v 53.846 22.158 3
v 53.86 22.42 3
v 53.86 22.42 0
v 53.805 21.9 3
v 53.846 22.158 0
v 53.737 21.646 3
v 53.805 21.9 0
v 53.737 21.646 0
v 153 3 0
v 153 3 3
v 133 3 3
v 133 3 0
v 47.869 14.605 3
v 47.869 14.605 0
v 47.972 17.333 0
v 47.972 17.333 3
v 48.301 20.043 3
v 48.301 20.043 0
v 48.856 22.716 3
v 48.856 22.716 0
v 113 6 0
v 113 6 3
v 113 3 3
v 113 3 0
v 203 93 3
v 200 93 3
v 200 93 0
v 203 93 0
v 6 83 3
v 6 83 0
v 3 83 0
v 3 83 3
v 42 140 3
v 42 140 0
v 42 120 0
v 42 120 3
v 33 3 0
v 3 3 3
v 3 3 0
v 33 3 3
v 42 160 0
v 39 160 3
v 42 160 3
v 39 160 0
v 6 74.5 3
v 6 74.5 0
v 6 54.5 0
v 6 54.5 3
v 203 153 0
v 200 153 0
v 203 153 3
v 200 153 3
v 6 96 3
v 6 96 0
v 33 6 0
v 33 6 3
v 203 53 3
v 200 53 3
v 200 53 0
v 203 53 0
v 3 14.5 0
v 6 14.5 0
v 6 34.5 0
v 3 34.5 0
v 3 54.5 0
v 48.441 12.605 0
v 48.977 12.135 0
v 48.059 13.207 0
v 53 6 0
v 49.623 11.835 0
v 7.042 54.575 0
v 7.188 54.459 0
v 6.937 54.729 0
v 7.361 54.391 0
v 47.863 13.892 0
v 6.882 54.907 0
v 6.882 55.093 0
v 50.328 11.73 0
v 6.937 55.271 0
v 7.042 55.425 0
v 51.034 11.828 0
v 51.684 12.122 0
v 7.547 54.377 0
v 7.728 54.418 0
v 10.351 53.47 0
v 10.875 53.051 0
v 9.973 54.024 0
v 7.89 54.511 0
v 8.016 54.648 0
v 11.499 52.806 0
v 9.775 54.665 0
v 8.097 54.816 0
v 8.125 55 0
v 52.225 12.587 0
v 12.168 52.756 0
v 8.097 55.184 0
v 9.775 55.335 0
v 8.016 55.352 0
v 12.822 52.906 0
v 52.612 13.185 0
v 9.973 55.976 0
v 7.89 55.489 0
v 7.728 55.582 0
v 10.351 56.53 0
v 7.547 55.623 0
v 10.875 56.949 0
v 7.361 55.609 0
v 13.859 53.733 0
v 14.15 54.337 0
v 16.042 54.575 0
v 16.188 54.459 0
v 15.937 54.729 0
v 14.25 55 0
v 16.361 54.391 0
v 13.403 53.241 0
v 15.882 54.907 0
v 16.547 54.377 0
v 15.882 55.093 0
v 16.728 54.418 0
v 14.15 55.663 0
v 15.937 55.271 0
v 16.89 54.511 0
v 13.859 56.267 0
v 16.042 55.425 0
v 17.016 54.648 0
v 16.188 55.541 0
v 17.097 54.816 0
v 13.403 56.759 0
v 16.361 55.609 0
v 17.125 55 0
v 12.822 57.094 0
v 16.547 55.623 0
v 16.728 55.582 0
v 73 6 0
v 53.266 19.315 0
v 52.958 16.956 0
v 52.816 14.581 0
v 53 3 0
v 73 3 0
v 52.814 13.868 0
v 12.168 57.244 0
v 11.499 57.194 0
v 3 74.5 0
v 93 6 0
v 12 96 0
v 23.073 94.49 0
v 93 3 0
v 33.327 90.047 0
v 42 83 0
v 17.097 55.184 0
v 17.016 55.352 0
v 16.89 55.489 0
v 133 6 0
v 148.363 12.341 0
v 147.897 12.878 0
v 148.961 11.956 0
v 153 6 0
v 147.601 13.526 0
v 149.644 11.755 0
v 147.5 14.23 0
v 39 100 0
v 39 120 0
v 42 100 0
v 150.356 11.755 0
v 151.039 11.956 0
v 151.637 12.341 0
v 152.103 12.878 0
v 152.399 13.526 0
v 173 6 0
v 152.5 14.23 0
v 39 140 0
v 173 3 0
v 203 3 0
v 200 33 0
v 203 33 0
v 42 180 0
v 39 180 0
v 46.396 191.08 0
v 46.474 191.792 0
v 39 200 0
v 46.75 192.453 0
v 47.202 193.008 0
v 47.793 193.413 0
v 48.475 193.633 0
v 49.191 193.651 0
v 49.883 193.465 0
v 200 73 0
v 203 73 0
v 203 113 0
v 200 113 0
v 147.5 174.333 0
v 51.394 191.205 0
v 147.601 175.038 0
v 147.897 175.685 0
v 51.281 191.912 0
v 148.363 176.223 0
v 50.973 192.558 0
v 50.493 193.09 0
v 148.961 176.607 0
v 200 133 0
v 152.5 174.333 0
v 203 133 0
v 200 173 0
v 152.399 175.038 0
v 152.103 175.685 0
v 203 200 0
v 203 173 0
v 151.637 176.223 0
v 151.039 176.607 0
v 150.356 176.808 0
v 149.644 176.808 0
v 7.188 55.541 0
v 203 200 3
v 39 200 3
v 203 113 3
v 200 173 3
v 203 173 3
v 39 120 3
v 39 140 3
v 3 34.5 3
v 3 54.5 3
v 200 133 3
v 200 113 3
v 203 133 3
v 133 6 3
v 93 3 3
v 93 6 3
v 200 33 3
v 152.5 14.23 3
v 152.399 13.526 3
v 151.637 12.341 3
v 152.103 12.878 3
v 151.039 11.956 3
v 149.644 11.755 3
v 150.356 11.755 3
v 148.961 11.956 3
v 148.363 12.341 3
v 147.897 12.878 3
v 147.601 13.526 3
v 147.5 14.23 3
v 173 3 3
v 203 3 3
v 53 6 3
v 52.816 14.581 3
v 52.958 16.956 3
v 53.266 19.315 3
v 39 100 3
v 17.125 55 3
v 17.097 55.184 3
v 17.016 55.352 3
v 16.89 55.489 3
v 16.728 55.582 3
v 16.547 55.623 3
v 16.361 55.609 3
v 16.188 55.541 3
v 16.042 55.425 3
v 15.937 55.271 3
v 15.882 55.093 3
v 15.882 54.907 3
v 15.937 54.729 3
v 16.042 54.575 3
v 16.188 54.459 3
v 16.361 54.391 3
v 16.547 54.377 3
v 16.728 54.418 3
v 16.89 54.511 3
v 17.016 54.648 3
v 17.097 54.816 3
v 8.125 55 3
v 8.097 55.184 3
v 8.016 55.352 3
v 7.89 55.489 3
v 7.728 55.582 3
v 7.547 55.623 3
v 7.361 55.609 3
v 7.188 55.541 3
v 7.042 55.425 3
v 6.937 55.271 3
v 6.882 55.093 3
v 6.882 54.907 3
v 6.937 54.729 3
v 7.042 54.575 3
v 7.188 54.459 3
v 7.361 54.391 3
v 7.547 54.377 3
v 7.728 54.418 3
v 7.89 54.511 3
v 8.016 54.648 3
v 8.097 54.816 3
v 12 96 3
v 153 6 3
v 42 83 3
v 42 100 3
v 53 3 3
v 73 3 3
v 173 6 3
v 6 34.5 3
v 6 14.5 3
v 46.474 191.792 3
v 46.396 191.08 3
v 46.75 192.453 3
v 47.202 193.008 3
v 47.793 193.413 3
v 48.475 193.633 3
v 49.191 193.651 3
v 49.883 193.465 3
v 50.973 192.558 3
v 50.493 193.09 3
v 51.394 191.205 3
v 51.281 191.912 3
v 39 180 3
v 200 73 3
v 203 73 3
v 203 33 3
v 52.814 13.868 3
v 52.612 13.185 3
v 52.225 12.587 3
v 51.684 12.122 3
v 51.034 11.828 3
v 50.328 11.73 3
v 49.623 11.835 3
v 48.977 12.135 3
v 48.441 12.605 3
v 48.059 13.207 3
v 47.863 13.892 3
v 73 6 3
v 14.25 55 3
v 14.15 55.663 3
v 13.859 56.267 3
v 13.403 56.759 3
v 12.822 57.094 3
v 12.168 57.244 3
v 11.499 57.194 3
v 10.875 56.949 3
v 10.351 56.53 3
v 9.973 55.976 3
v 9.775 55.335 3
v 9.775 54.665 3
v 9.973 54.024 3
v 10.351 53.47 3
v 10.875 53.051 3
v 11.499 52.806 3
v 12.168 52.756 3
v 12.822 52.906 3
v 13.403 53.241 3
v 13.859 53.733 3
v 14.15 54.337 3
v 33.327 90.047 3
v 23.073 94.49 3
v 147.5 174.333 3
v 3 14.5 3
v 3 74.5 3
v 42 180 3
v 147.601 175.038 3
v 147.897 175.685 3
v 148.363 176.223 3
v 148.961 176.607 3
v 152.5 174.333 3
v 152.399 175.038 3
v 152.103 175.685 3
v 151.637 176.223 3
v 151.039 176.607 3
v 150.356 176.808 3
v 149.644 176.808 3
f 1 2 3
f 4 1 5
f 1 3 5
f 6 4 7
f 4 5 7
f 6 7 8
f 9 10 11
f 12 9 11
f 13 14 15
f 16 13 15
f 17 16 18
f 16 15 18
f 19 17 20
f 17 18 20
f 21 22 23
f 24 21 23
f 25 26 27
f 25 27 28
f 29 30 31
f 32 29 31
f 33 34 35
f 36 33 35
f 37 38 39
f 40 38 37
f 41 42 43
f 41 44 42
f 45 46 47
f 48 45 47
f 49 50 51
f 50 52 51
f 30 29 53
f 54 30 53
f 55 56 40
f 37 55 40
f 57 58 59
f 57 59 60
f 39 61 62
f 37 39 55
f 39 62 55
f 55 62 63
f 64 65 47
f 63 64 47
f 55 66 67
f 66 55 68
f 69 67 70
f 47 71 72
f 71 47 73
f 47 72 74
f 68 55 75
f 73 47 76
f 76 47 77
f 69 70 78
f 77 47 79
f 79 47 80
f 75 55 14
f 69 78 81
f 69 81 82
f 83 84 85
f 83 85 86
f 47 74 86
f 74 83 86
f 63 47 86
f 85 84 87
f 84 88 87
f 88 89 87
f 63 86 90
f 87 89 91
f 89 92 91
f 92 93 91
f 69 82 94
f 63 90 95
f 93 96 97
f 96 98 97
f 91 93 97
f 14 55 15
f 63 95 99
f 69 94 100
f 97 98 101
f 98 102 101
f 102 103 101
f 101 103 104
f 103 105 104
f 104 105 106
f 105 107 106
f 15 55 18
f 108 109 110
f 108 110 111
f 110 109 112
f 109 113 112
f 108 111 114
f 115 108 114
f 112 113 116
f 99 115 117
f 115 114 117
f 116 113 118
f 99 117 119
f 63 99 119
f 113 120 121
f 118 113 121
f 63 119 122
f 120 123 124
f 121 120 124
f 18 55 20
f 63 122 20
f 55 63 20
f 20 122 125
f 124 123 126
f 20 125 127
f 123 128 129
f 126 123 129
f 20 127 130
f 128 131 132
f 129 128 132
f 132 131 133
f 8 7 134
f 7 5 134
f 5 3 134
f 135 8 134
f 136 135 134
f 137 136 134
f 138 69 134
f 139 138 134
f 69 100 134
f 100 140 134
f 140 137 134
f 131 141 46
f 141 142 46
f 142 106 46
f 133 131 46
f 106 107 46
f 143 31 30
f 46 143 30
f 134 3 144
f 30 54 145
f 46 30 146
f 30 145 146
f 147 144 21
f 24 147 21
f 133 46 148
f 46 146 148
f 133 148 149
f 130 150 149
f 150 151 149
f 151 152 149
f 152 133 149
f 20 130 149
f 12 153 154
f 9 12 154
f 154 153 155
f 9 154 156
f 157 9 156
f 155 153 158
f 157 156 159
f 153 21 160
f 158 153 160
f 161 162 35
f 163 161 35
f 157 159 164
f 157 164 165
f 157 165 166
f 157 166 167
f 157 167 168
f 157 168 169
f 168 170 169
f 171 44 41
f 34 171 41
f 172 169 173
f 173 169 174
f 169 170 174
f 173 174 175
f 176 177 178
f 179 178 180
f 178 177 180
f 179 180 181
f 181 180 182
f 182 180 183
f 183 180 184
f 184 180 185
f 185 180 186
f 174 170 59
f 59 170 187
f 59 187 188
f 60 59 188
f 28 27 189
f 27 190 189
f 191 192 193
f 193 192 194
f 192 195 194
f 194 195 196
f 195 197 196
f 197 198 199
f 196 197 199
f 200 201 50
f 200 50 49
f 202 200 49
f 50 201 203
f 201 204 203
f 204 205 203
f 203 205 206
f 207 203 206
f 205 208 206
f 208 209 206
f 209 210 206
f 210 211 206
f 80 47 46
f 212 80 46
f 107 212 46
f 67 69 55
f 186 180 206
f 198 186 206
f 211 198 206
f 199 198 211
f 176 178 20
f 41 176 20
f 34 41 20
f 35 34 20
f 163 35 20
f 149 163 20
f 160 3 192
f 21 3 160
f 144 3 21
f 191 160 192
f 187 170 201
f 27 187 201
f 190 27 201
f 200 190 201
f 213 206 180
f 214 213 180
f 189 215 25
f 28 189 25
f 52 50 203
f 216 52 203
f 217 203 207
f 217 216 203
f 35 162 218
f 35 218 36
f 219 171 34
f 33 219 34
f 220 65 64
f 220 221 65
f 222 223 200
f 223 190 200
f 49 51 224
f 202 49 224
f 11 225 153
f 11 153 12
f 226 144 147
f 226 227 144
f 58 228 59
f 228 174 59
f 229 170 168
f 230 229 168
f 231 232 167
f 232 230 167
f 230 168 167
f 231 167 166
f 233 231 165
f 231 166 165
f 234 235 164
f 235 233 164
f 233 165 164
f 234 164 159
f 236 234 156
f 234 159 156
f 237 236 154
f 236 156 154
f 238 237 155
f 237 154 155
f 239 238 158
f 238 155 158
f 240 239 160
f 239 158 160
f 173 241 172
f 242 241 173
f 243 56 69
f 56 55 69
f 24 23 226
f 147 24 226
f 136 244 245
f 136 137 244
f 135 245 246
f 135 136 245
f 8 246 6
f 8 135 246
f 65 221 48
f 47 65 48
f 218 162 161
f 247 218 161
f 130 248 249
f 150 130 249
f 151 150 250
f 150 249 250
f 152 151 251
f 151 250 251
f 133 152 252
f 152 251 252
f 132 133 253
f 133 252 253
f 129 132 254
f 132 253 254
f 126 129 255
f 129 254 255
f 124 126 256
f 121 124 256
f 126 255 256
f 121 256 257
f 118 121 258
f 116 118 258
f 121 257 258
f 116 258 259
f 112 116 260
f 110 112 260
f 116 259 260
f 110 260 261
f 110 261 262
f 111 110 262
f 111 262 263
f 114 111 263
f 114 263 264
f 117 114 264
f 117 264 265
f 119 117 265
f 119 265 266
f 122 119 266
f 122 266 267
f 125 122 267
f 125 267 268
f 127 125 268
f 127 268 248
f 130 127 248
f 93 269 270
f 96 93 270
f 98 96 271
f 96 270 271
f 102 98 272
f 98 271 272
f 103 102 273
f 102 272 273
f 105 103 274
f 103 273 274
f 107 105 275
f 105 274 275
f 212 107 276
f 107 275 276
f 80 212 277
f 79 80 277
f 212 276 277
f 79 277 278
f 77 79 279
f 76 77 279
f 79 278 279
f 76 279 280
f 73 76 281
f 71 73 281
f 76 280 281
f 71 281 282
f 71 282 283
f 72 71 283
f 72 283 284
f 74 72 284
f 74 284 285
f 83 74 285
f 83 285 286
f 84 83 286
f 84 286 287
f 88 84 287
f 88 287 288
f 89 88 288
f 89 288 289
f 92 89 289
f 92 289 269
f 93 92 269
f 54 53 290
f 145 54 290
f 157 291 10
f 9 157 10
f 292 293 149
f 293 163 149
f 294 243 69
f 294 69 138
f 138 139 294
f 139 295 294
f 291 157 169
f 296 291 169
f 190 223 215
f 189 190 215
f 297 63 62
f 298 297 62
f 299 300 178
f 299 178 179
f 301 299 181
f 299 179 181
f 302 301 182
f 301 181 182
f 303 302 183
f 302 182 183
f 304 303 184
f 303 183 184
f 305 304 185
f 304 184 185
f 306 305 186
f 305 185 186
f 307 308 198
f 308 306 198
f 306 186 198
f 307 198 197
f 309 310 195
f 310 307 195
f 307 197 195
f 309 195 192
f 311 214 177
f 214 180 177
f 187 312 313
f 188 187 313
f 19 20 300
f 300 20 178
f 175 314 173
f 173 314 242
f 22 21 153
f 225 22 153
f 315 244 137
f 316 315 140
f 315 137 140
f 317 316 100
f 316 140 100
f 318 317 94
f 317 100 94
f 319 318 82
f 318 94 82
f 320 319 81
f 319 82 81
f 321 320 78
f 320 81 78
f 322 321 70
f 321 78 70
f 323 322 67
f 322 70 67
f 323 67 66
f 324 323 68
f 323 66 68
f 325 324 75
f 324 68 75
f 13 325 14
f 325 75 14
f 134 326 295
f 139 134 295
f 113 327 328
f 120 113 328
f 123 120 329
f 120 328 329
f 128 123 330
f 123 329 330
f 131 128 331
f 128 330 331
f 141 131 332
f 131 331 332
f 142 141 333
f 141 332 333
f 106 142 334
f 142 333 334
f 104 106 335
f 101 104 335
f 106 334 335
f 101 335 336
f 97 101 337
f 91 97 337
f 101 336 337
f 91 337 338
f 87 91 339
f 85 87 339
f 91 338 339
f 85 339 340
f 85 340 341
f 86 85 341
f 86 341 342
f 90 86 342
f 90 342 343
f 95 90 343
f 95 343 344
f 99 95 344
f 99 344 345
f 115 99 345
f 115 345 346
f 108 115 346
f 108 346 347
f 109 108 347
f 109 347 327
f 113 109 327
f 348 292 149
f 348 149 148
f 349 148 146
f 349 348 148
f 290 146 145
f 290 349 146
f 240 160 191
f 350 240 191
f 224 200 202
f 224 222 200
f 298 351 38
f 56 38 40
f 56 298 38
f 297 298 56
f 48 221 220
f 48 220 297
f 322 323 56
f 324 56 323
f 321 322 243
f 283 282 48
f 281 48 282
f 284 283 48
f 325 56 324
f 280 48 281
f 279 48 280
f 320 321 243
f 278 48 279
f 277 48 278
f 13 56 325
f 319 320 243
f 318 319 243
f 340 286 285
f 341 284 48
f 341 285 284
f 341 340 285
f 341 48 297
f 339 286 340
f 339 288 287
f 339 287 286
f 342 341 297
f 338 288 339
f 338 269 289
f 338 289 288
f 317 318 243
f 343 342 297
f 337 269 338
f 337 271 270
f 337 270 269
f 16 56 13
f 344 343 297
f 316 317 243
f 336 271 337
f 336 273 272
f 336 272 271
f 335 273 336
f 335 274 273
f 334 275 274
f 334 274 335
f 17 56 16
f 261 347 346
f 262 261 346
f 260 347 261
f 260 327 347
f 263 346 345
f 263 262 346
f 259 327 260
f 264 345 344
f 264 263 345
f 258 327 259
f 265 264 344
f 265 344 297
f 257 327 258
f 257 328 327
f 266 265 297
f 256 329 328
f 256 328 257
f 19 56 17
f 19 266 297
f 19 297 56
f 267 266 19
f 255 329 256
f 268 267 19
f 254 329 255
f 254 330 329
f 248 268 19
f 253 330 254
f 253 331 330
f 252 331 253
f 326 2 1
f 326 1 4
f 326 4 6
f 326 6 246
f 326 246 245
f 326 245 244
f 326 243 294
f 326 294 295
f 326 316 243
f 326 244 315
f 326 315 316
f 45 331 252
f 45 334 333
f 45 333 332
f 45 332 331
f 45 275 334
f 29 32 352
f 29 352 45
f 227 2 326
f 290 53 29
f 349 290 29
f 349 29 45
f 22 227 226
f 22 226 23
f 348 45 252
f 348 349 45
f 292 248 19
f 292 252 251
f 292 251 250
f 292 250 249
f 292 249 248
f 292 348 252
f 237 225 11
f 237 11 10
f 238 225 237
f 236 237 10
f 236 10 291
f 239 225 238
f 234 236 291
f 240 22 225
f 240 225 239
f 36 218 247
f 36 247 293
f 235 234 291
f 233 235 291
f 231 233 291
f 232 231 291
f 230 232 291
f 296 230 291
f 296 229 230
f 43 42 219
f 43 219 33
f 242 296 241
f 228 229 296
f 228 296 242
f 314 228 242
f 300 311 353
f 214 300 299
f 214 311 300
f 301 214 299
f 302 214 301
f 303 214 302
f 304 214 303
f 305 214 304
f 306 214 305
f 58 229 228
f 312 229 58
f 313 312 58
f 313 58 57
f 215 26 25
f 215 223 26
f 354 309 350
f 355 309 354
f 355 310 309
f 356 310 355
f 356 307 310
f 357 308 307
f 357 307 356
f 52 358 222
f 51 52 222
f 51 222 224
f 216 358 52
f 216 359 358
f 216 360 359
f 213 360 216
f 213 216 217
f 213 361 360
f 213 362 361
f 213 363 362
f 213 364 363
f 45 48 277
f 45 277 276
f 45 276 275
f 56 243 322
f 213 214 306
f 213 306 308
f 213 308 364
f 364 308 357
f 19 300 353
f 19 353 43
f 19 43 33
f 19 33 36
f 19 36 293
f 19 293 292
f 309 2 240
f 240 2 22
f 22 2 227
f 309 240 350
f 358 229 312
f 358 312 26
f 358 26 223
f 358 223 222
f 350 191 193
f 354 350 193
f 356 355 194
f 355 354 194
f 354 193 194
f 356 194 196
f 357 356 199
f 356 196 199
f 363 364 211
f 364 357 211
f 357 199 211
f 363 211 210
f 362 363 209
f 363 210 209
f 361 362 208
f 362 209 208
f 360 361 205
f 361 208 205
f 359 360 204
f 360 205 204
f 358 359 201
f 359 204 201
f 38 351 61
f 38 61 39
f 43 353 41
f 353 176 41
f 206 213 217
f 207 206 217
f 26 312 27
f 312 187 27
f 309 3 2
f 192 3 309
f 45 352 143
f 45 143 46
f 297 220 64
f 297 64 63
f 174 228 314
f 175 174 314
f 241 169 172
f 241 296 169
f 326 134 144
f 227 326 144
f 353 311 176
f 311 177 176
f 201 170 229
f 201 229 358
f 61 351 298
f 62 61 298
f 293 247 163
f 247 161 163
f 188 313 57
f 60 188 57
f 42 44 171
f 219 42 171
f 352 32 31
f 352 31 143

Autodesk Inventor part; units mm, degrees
ref_plane "YZ Plane" through (0, 0, 0) normal (1, 0, 0) x (0, 1, 0)
ref_plane "XZ Plane" through (0, 0, 0) normal (0, 1, 0) x (-1, 0, 0)
ref_plane "XY Plane" through (0, 0, 0) normal (0, 0, 1) x (1, 0, 0)
sketch "Sketch1" plane through (0, 0, 0) normal (0, 0, 1) x (1, 0, 0)
  line L0 (6, 6) -> (200, 6)
  line L1 (200, 6) -> (200, 200)
  line L2 (200, 200) -> (42, 200)
  line L3 (6, 83) -> (6, 6)
  line L4 (6, 6) -> (56, 6)
  line L5 (200, 6) -> (150, 6)
  line L6 (200, 6) -> (200, 153)
  line L7 (150, 6) -> (142.5, 6)
  line L8 (200, 6) -> (200, 166)
  arc A0 (152.5, 174.3333) -> (147.5, 174.3333) centre (150, 174.3333) ccw
  line L9 (150, 6) -> (50, 6)
  arc A1 (47.8689, 14.6053) -> (52.8158, 14.5813) centre (50.3406, 14.23) ccw
  arc A2 (53.8259, 22.009) -> (52.8051, 13.8106) centre (86.918, 13.7258) ccw
  arc A3 (51.3944, 191.2047) -> (46.3962, 191.0801) centre (48.8946, 191.1682) ccw
  line L10 (53.8599, 22.4199) -> (51.3944, 191.2047)
  line L11 (48.8556, 22.7156) -> (46.3962, 191.0801)
  arc A4 (53.7373, 21.6465) -> (53.8589, 22.4929) centre (51.3599, 22.4199) ccw
  arc A5 (48.8556, 22.7156) -> (47.8689, 14.6053) centre (80.6169, 14.7362) ccw
  line L12 (52.8406, 14.23) -> (52.8088, 14.23)
  arc A6 (147.5, 14.23) -> (152.5, 14.23) centre (150, 14.23) ccw
  line L13 (147.5, 14.23) -> (147.5, 174.3333)
  line L14 (152.5, 14.23) -> (152.5, 174.3333)
  line L15 (42, 83) -> (6, 83)
  line L16 (42, 200) -> (39, 200)
  line L17 (39, 200) -> (39, 180)
  line L18 (39, 160) -> (39, 140)
  line L19 (39, 120) -> (39, 100)
  line L20 (39, 100) -> (42, 100)
  line L21 (39, 120) -> (42, 120)
  line L22 (39, 140) -> (42, 140)
  line L23 (39, 160) -> (42, 160)
  line L24 (39, 180) -> (42, 180)
  line L25 (39, 120) -> (39, 100)
  line L26 (39, 200) -> (39, 180)
  line L27 (39, 160) -> (39, 140)
  line L28 (42, 180) -> (42, 160)
  line L29 (42, 140) -> (42, 120)
  line L30 (42, 100) -> (42, 83)
  dimension "d1" = 194
extrude "Extrusion1" add sketch "Sketch1" along normal blind 3
sketch "Sketch2" plane through (0, 0, 3) normal (0, 0, 1) x (1, 0, 0)
  line L0 (200, 6) -> (200, 200) projected
  line L1 (200, 200) -> (39, 200) projected
  line L2 (42, 180) -> (42, 160) projected
  line L3 (42, 83) -> (6, 83) projected
  line L4 (6, 83) -> (6, 6) projected
  line L5 (6, 6) -> (200, 6) projected
  line L6 (147.5, 14.23) -> (147.5, 174.3333) projected
  arc A0 (152.5, 174.3333) -> (147.5, 174.3333) centre (150, 174.3333) ccw projected
  line L7 (152.5, 174.3333) -> (152.5, 14.23) projected
  arc A1 (147.5, 14.23) -> (152.5, 14.23) centre (150, 14.23) ccw projected
  arc A2 (51.3944, 191.2047) -> (46.3962, 191.0801) centre (48.8946, 191.1682) ccw projected
  line L8 (51.3944, 191.2047) -> (53.8589, 22.4929) projected
  arc A3 (53.7373, 21.6465) -> (53.8589, 22.4929) centre (51.3599, 22.4199) ccw projected
  arc A4 (53.7373, 21.6465) -> (52.8158, 14.5813) centre (86.918, 13.7258) ccw projected
  arc A5 (47.8689, 14.6053) -> (52.8158, 14.5813) centre (50.3406, 14.23) ccw projected
  arc A6 (48.8556, 22.7156) -> (47.8689, 14.6053) centre (80.6169, 14.7362) ccw projected
  line L9 (48.8556, 22.7156) -> (46.3962, 191.0801) projected
  line L10 (6, 6) -> (33, 6)
  line L11 (33, 6) -> (53, 6)
  line L12 (53, 6) -> (73, 6)
  line L13 (73, 6) -> (93, 6)
  line L14 (93, 6) -> (113, 6)
  line L15 (113, 6) -> (133, 6)
  line L16 (133, 6) -> (153, 6)
  line L17 (153, 6) -> (173, 6)
  line L18 (6, 6) -> (6, 9)
  line L19 (33, 6) -> (33, 3)
  line L20 (173, 6) -> (173, 3)
  line L21 (53, 6) -> (53, 3)
  line L22 (93, 6) -> (93, 3)
  line L23 (73, 6) -> (73, 3)
  line L24 (133, 6) -> (133, 3)
  line L25 (113, 6) -> (113, 3)
  line L26 (153, 6) -> (153, 3)
  line L27 (6, 6) -> (6, 3)
  line L28 (6, 3) -> (33, 3)
  line L29 (173, 3) -> (200, 3)
  line L30 (200, 3) -> (200, 6.6126)
  line L31 (73, 3) -> (53, 3)
  line L32 (153, 3) -> (133, 3)
  line L33 (113, 3) -> (93, 3)
  line L34 (39, 200) -> (39, 180) projected
  line L35 (39, 180) -> (42, 180) projected
  line L36 (42, 160) -> (39, 160) projected
  line L37 (39, 160) -> (39, 140) projected
  line L38 (39, 140) -> (42, 140) projected
  line L39 (42, 140) -> (42, 120) projected
  line L40 (42, 120) -> (39, 120) projected
  line L41 (39, 120) -> (39, 100) projected
  line L42 (39, 100) -> (42, 100) projected
  line L43 (42, 100) -> (42, 83) projected
  point P0 (120.702, 9)
  point P1 (49.056, 9)
extrude "Extrusion2" add sketch "Sketch2" against normal blind 3 contours L30 L29 L20 L5 | L26 L32 L24 L5 | L25 L33 L22 L5 | L23 L31 L21 L5 | L19 L28 L27 L5
sketch "Sketch3" plane through (0, 0, 3) normal (0, 0, 1) x (1, 0, 0)
  line L0 (153, 6) -> (173, 6) projected
  line L1 (113, 6) -> (133, 6) projected
  line L2 (200, 3) -> (200, 200) projected
  line L3 (200, 200) -> (39, 200) projected
  line L4 (42, 180) -> (42, 160) projected
  line L5 (42, 83) -> (6, 83) projected
  line L6 (6, 83) -> (6, 3) projected
  line L7 (73, 6) -> (93, 6) projected
  line L8 (33, 6) -> (53, 6) projected
  line L9 (147.5, 14.23) -> (147.5, 174.3333) projected
  arc A0 (152.5, 174.3333) -> (147.5, 174.3333) centre (150, 174.3333) ccw projected
  line L10 (152.5, 174.3333) -> (152.5, 14.23) projected
  arc A1 (147.5, 14.23) -> (152.5, 14.23) centre (150, 14.23) ccw projected
  arc A2 (51.3944, 191.2047) -> (46.3962, 191.0801) centre (48.8946, 191.1682) ccw projected
  line L11 (51.3944, 191.2047) -> (53.8589, 22.4929) projected
  arc A3 (53.7373, 21.6465) -> (53.8589, 22.4929) centre (51.3599, 22.4199) ccw projected
  arc A4 (53.7373, 21.6465) -> (52.8158, 14.5813) centre (86.918, 13.7258) ccw projected
  arc A5 (47.8689, 14.6053) -> (52.8158, 14.5813) centre (50.3406, 14.23) ccw projected
  arc A6 (48.8556, 22.7156) -> (47.8689, 14.6053) centre (80.6169, 14.7362) ccw projected
  line L12 (48.8556, 22.7156) -> (46.3962, 191.0801) projected
  line L13 (6, 83) -> (6, 80)
  line L14 (6, 83) -> (3, 83)
  line L15 (3, 6) -> (3, 14.5)
  line L16 (3, 83) -> (3, 74.5)
  line L17 (3, 54.5) -> (3, 34.5)
  line L18 (3, 74.5) -> (6, 74.5)
  line L19 (3, 54.5) -> (6, 54.5)
  line L20 (3, 34.5) -> (6, 34.5)
  line L21 (3, 14.5) -> (6, 14.5)
  line L22 (3, 14.5) -> (3, 6)
  line L23 (3, 83) -> (3, 74.5)
  line L24 (3, 54.5) -> (3, 34.5)
  line L25 (3, 6) -> (3, 3)
  line L26 (3, 3) -> (6, 3)
  line L27 (6, 3) -> (6, 6)
  line L28 (6, 3) -> (33, 3) projected
  line L29 (33, 3) -> (33, 6) projected
  line L30 (53, 6) -> (53, 3) projected
  line L31 (53, 3) -> (73, 3) projected
  line L32 (73, 3) -> (73, 6) projected
  line L33 (93, 6) -> (93, 3) projected
  line L34 (93, 3) -> (113, 3) projected
  line L35 (113, 3) -> (113, 6) projected
  line L36 (133, 6) -> (133, 3) projected
  line L37 (133, 3) -> (153, 3) projected
  line L38 (153, 3) -> (153, 6) projected
  line L39 (173, 6) -> (173, 3) projected
  line L40 (173, 3) -> (200, 3) projected
  line L41 (39, 200) -> (39, 180) projected
  line L42 (39, 180) -> (42, 180) projected
  line L43 (42, 160) -> (39, 160) projected
  line L44 (39, 160) -> (39, 140) projected
  line L45 (39, 140) -> (42, 140) projected
  line L46 (42, 140) -> (42, 120) projected
  line L47 (42, 120) -> (39, 120) projected
  line L48 (39, 120) -> (39, 100) projected
  line L49 (39, 100) -> (42, 100) projected
  line L50 (42, 100) -> (42, 83) projected
  point P0 (6, 3)
  dimension "d43" = 3
extrude "Extrusion3" add sketch "Sketch3" against normal blind 3 contours L26 L25 L15 L21 L6 | L6 L18 L16 L14 | L20 L17 L19 L6
sketch "Sketch4" plane through (0, 0, 3) normal (0, 0, 1) x (1, 0, 0)
  line L0 (153, 6) -> (173, 6) projected
  line L1 (113, 6) -> (133, 6) projected
  line L2 (200, 200) -> (39, 200) projected
  line L3 (42, 180) -> (42, 160) projected
  line L4 (42, 83) -> (3, 83) projected
  line L5 (3, 83) -> (3, 74.5) projected
  line L6 (3, 74.5) -> (6, 74.5) projected
  line L7 (6, 74.5) -> (6, 54.5) projected
  line L8 (6, 54.5) -> (3, 54.5) projected
  line L9 (3, 54.5) -> (3, 34.5) projected
  line L10 (3, 34.5) -> (6, 34.5) projected
  line L11 (73, 6) -> (93, 6) projected
  line L12 (33, 6) -> (53, 6) projected
  line L13 (147.5, 14.23) -> (147.5, 174.3333) projected
  arc A0 (152.5, 174.3333) -> (147.5, 174.3333) centre (150, 174.3333) ccw projected
  line L14 (152.5, 174.3333) -> (152.5, 14.23) projected
  arc A1 (147.5, 14.23) -> (152.5, 14.23) centre (150, 14.23) ccw projected
  arc A2 (51.3944, 191.2047) -> (46.3962, 191.0801) centre (48.8946, 191.1682) ccw projected
  line L15 (51.3944, 191.2047) -> (53.8589, 22.4929) projected
  arc A3 (53.7373, 21.6465) -> (53.8589, 22.4929) centre (51.3599, 22.4199) ccw projected
  arc A4 (53.7373, 21.6465) -> (52.8158, 14.5813) centre (86.918, 13.7258) ccw projected
  arc A5 (47.8689, 14.6053) -> (52.8158, 14.5813) centre (50.3406, 14.23) ccw projected
  arc A6 (48.8556, 22.7156) -> (47.8689, 14.6053) centre (80.6169, 14.7362) ccw projected
  line L16 (48.8556, 22.7156) -> (46.3962, 191.0801) projected
  line L17 (200, 200) -> (203, 200)
  line L18 (200, 6) -> (200, 33)
  line L19 (200, 33) -> (200, 53)
  line L20 (200, 53) -> (200, 73)
  line L21 (200, 73) -> (200, 93)
  line L22 (200, 93) -> (200, 113)
  line L23 (200, 113) -> (200, 133)
  line L24 (200, 133) -> (200, 153)
  line L25 (200, 153) -> (200, 173)
  line L26 (200, 173) -> (200, 200)
  line L27 (200, 173) -> (203, 173)
  line L28 (200, 153) -> (203, 153)
  line L29 (200, 133) -> (203, 133)
  line L30 (200, 113) -> (203, 113)
  line L31 (200, 93) -> (203, 93)
  line L32 (200, 73) -> (203, 73)
  line L33 (200, 53) -> (203, 53)
  line L34 (200, 33) -> (203, 33)
  line L35 (203, 200) -> (203, 173)
  line L36 (203, 153) -> (203, 133)
  line L37 (203, 113) -> (203, 93)
  line L38 (203, 73) -> (203, 53)
  line L39 (203, 33) -> (203, 6)
  line L40 (200, 3) -> (200, 200) projected
  line L41 (6, 34.5) -> (6, 14.5) projected
  line L42 (3, 3) -> (33, 3) projected
  line L43 (33, 3) -> (33, 6) projected
  line L44 (53, 6) -> (53, 3) projected
  line L45 (53, 3) -> (73, 3) projected
  line L46 (73, 3) -> (73, 6) projected
  line L47 (93, 6) -> (93, 3) projected
  line L48 (93, 3) -> (113, 3) projected
  line L49 (113, 3) -> (113, 6) projected
  line L50 (133, 6) -> (133, 3) projected
  line L51 (133, 3) -> (153, 3) projected
  line L52 (153, 3) -> (153, 6) projected
  line L53 (173, 6) -> (173, 3) projected
  line L54 (173, 3) -> (200, 3) projected
  line L55 (6, 14.5) -> (3, 14.5) projected
  line L56 (3, 14.5) -> (3, 3) projected
  line L57 (200, 3) -> (203, 3)
  line L58 (203, 3) -> (203, 6)
  line L59 (39, 200) -> (39, 180) projected
  line L60 (39, 180) -> (42, 180) projected
  line L61 (42, 160) -> (39, 160) projected
  line L62 (39, 160) -> (39, 140) projected
  line L63 (39, 140) -> (42, 140) projected
  line L64 (42, 140) -> (42, 120) projected
  line L65 (42, 120) -> (39, 120) projected
  line L66 (39, 120) -> (39, 100) projected
  line L67 (39, 100) -> (42, 100) projected
  line L68 (42, 100) -> (42, 83) projected
extrude "Extrusion4" add sketch "Sketch4" against normal blind 3 contours L40 L18 L34 L39 L58 L57 | L20 L32 L38 L33 | L22 L30 L37 L31 | L24 L28 L36 L29 | L26 L17 L35 L27
sketch "Sketch7" plane through (0, 0, 3) normal (0, 0, 1) x (1, 0, 0)
  line L0 (6, 60) -> (18, 60)
  line L1 (18, 60) -> (18, 50)
  line L2 (18, 50) -> (6, 50)
  line L3 (6, 50) -> (6, 60)
  line L4 (6, 60) -> (18, 50) construction
  line L5 (18, 60) -> (6, 50) construction
  line L6 (12, 55) -> (7.5, 55)
  line L7 (7.5, 55) -> (16.5, 55)
  circle A0 centre (7.5, 55) radius 0.625
  circle A1 centre (16.5, 55) radius 0.625
  line L8 (6.875, 55) -> (12, 55)
  circle A2 centre (12, 55) radius 2.25
  dimension "d74" = 1.25
  dimension "d70" = 12
  dimension "d71" = 10
  dimension "d72" = 4.5
  dimension "d73" = 9
  dimension "d75" = 1.25
  dimension "d78" = 4.5
extrude "Extrusion5" cut sketch "Sketch7" against normal blind 3 contours A0 L8 L6 | A1 | A2 L7 L6 | L6 L7 A2 | L6 L8 A0
sketch "Sketch8" plane through (0, 0, 3) normal (0, 0, 1) x (1, 0, 0)
  circle A0 centre (12, 55) radius 2.25 projected
  line L0 (12, 55) -> (12, 96)
  circle A1 centre (16.5, 55) radius 0.625 projected
  circle A2 centre (7.5, 55) radius 0.625 projected
  circle A3 centre (12, 55) radius 2.25 projected
  line L1 (200, 33) -> (200, 53) projected
  line L2 (200, 53) -> (203, 53) projected
  line L3 (203, 53) -> (203, 73) projected
  line L4 (203, 73) -> (200, 73) projected
  line L5 (200, 73) -> (200, 93) projected
  line L6 (200, 93) -> (203, 93) projected
  line L7 (203, 93) -> (203, 113) projected
  line L8 (203, 113) -> (200, 113) projected
  line L9 (200, 113) -> (200, 133) projected
  line L10 (200, 133) -> (203, 133) projected
  line L11 (203, 133) -> (203, 153) projected
  line L12 (203, 153) -> (200, 153) projected
  line L13 (200, 153) -> (200, 173) projected
  line L14 (200, 173) -> (203, 173) projected
  line L15 (203, 173) -> (203, 200) projected
  line L16 (203, 200) -> (39, 200) projected
  line L17 (42, 180) -> (42, 160) projected
  line L18 (42, 83) -> (3, 83) projected
  line L19 (3, 83) -> (3, 74.5) projected
  line L20 (3, 74.5) -> (6, 74.5) projected
  line L21 (6, 74.5) -> (6, 54.5) projected
  line L22 (6, 54.5) -> (3, 54.5) projected
  line L23 (3, 54.5) -> (3, 34.5) projected
  line L24 (3, 34.5) -> (6, 34.5) projected
  line L25 (6, 34.5) -> (6, 14.5) projected
  line L26 (6, 14.5) -> (3, 14.5) projected
  line L27 (3, 14.5) -> (3, 3) projected
  line L28 (3, 3) -> (33, 3) projected
  line L29 (33, 3) -> (33, 6) projected
  line L30 (33, 6) -> (53, 6) projected
  line L31 (53, 6) -> (53, 3) projected
  line L32 (53, 3) -> (73, 3) projected
  line L33 (73, 3) -> (73, 6) projected
  line L34 (73, 6) -> (93, 6) projected
  line L35 (93, 6) -> (93, 3) projected
  line L36 (93, 3) -> (113, 3) projected
  line L37 (113, 3) -> (113, 6) projected
  line L38 (113, 6) -> (133, 6) projected
  line L39 (133, 6) -> (133, 3) projected
  line L40 (133, 3) -> (153, 3) projected
  line L41 (153, 3) -> (153, 6) projected
  line L42 (153, 6) -> (173, 6) projected
  line L43 (173, 6) -> (173, 3) projected
  line L44 (173, 3) -> (203, 3) projected
  line L45 (203, 3) -> (203, 33) projected
  line L46 (203, 33) -> (200, 33) projected
  line L47 (147.5, 14.23) -> (147.5, 174.3333) projected
  arc A4 (152.5, 174.3333) -> (147.5, 174.3333) centre (150, 174.3333) ccw projected
  line L48 (152.5, 174.3333) -> (152.5, 14.23) projected
  arc A5 (147.5, 14.23) -> (152.5, 14.23) centre (150, 14.23) ccw projected
  arc A6 (51.3944, 191.2047) -> (46.3962, 191.0801) centre (48.8946, 191.1682) ccw projected
  line L49 (51.3944, 191.2047) -> (53.8589, 22.4929) projected
  arc A7 (53.7373, 21.6465) -> (53.8589, 22.4929) centre (51.3599, 22.4199) ccw projected
  arc A8 (53.7373, 21.6465) -> (52.8158, 14.5813) centre (86.918, 13.7258) ccw projected
  arc A9 (47.8689, 14.6053) -> (52.8158, 14.5813) centre (50.3406, 14.23) ccw projected
  arc A10 (48.8556, 22.7156) -> (47.8689, 14.6053) centre (80.6169, 14.7362) ccw projected
  line L50 (48.8556, 22.7156) -> (46.3962, 191.0801) projected
  line L51 (42, 83) -> (3, 83) projected
  line L52 (12, 55) -> (42, 83)
  arc A11 (42, 83) -> (12, 96) centre (12.05, 55) ccw
  line L53 (3, 83) -> (6, 83)
  line L54 (6, 83) -> (6, 96)
  line L55 (6, 96) -> (12, 96)
  line L56 (6, 83) -> (42, 83)
  line L57 (39, 200) -> (39, 180) projected
  line L58 (39, 180) -> (42, 180) projected
  line L59 (42, 160) -> (39, 160) projected
  line L60 (39, 160) -> (39, 140) projected
  line L61 (39, 140) -> (42, 140) projected
  line L62 (42, 140) -> (42, 120) projected
  line L63 (42, 120) -> (39, 120) projected
  line L64 (39, 120) -> (39, 100) projected
  line L65 (39, 100) -> (42, 100) projected
  line L66 (42, 100) -> (42, 83) projected
  dimension "d79" = 41
  dimension "d80" = 41
  dimension "d81" = 3
  dimension "d82" = 13
extrude "Extrusion6" add sketch "Sketch8" against normal blind 3 contours L18 L0 A11 | L18 L54 L55 L0
properties part number "inside walls"
